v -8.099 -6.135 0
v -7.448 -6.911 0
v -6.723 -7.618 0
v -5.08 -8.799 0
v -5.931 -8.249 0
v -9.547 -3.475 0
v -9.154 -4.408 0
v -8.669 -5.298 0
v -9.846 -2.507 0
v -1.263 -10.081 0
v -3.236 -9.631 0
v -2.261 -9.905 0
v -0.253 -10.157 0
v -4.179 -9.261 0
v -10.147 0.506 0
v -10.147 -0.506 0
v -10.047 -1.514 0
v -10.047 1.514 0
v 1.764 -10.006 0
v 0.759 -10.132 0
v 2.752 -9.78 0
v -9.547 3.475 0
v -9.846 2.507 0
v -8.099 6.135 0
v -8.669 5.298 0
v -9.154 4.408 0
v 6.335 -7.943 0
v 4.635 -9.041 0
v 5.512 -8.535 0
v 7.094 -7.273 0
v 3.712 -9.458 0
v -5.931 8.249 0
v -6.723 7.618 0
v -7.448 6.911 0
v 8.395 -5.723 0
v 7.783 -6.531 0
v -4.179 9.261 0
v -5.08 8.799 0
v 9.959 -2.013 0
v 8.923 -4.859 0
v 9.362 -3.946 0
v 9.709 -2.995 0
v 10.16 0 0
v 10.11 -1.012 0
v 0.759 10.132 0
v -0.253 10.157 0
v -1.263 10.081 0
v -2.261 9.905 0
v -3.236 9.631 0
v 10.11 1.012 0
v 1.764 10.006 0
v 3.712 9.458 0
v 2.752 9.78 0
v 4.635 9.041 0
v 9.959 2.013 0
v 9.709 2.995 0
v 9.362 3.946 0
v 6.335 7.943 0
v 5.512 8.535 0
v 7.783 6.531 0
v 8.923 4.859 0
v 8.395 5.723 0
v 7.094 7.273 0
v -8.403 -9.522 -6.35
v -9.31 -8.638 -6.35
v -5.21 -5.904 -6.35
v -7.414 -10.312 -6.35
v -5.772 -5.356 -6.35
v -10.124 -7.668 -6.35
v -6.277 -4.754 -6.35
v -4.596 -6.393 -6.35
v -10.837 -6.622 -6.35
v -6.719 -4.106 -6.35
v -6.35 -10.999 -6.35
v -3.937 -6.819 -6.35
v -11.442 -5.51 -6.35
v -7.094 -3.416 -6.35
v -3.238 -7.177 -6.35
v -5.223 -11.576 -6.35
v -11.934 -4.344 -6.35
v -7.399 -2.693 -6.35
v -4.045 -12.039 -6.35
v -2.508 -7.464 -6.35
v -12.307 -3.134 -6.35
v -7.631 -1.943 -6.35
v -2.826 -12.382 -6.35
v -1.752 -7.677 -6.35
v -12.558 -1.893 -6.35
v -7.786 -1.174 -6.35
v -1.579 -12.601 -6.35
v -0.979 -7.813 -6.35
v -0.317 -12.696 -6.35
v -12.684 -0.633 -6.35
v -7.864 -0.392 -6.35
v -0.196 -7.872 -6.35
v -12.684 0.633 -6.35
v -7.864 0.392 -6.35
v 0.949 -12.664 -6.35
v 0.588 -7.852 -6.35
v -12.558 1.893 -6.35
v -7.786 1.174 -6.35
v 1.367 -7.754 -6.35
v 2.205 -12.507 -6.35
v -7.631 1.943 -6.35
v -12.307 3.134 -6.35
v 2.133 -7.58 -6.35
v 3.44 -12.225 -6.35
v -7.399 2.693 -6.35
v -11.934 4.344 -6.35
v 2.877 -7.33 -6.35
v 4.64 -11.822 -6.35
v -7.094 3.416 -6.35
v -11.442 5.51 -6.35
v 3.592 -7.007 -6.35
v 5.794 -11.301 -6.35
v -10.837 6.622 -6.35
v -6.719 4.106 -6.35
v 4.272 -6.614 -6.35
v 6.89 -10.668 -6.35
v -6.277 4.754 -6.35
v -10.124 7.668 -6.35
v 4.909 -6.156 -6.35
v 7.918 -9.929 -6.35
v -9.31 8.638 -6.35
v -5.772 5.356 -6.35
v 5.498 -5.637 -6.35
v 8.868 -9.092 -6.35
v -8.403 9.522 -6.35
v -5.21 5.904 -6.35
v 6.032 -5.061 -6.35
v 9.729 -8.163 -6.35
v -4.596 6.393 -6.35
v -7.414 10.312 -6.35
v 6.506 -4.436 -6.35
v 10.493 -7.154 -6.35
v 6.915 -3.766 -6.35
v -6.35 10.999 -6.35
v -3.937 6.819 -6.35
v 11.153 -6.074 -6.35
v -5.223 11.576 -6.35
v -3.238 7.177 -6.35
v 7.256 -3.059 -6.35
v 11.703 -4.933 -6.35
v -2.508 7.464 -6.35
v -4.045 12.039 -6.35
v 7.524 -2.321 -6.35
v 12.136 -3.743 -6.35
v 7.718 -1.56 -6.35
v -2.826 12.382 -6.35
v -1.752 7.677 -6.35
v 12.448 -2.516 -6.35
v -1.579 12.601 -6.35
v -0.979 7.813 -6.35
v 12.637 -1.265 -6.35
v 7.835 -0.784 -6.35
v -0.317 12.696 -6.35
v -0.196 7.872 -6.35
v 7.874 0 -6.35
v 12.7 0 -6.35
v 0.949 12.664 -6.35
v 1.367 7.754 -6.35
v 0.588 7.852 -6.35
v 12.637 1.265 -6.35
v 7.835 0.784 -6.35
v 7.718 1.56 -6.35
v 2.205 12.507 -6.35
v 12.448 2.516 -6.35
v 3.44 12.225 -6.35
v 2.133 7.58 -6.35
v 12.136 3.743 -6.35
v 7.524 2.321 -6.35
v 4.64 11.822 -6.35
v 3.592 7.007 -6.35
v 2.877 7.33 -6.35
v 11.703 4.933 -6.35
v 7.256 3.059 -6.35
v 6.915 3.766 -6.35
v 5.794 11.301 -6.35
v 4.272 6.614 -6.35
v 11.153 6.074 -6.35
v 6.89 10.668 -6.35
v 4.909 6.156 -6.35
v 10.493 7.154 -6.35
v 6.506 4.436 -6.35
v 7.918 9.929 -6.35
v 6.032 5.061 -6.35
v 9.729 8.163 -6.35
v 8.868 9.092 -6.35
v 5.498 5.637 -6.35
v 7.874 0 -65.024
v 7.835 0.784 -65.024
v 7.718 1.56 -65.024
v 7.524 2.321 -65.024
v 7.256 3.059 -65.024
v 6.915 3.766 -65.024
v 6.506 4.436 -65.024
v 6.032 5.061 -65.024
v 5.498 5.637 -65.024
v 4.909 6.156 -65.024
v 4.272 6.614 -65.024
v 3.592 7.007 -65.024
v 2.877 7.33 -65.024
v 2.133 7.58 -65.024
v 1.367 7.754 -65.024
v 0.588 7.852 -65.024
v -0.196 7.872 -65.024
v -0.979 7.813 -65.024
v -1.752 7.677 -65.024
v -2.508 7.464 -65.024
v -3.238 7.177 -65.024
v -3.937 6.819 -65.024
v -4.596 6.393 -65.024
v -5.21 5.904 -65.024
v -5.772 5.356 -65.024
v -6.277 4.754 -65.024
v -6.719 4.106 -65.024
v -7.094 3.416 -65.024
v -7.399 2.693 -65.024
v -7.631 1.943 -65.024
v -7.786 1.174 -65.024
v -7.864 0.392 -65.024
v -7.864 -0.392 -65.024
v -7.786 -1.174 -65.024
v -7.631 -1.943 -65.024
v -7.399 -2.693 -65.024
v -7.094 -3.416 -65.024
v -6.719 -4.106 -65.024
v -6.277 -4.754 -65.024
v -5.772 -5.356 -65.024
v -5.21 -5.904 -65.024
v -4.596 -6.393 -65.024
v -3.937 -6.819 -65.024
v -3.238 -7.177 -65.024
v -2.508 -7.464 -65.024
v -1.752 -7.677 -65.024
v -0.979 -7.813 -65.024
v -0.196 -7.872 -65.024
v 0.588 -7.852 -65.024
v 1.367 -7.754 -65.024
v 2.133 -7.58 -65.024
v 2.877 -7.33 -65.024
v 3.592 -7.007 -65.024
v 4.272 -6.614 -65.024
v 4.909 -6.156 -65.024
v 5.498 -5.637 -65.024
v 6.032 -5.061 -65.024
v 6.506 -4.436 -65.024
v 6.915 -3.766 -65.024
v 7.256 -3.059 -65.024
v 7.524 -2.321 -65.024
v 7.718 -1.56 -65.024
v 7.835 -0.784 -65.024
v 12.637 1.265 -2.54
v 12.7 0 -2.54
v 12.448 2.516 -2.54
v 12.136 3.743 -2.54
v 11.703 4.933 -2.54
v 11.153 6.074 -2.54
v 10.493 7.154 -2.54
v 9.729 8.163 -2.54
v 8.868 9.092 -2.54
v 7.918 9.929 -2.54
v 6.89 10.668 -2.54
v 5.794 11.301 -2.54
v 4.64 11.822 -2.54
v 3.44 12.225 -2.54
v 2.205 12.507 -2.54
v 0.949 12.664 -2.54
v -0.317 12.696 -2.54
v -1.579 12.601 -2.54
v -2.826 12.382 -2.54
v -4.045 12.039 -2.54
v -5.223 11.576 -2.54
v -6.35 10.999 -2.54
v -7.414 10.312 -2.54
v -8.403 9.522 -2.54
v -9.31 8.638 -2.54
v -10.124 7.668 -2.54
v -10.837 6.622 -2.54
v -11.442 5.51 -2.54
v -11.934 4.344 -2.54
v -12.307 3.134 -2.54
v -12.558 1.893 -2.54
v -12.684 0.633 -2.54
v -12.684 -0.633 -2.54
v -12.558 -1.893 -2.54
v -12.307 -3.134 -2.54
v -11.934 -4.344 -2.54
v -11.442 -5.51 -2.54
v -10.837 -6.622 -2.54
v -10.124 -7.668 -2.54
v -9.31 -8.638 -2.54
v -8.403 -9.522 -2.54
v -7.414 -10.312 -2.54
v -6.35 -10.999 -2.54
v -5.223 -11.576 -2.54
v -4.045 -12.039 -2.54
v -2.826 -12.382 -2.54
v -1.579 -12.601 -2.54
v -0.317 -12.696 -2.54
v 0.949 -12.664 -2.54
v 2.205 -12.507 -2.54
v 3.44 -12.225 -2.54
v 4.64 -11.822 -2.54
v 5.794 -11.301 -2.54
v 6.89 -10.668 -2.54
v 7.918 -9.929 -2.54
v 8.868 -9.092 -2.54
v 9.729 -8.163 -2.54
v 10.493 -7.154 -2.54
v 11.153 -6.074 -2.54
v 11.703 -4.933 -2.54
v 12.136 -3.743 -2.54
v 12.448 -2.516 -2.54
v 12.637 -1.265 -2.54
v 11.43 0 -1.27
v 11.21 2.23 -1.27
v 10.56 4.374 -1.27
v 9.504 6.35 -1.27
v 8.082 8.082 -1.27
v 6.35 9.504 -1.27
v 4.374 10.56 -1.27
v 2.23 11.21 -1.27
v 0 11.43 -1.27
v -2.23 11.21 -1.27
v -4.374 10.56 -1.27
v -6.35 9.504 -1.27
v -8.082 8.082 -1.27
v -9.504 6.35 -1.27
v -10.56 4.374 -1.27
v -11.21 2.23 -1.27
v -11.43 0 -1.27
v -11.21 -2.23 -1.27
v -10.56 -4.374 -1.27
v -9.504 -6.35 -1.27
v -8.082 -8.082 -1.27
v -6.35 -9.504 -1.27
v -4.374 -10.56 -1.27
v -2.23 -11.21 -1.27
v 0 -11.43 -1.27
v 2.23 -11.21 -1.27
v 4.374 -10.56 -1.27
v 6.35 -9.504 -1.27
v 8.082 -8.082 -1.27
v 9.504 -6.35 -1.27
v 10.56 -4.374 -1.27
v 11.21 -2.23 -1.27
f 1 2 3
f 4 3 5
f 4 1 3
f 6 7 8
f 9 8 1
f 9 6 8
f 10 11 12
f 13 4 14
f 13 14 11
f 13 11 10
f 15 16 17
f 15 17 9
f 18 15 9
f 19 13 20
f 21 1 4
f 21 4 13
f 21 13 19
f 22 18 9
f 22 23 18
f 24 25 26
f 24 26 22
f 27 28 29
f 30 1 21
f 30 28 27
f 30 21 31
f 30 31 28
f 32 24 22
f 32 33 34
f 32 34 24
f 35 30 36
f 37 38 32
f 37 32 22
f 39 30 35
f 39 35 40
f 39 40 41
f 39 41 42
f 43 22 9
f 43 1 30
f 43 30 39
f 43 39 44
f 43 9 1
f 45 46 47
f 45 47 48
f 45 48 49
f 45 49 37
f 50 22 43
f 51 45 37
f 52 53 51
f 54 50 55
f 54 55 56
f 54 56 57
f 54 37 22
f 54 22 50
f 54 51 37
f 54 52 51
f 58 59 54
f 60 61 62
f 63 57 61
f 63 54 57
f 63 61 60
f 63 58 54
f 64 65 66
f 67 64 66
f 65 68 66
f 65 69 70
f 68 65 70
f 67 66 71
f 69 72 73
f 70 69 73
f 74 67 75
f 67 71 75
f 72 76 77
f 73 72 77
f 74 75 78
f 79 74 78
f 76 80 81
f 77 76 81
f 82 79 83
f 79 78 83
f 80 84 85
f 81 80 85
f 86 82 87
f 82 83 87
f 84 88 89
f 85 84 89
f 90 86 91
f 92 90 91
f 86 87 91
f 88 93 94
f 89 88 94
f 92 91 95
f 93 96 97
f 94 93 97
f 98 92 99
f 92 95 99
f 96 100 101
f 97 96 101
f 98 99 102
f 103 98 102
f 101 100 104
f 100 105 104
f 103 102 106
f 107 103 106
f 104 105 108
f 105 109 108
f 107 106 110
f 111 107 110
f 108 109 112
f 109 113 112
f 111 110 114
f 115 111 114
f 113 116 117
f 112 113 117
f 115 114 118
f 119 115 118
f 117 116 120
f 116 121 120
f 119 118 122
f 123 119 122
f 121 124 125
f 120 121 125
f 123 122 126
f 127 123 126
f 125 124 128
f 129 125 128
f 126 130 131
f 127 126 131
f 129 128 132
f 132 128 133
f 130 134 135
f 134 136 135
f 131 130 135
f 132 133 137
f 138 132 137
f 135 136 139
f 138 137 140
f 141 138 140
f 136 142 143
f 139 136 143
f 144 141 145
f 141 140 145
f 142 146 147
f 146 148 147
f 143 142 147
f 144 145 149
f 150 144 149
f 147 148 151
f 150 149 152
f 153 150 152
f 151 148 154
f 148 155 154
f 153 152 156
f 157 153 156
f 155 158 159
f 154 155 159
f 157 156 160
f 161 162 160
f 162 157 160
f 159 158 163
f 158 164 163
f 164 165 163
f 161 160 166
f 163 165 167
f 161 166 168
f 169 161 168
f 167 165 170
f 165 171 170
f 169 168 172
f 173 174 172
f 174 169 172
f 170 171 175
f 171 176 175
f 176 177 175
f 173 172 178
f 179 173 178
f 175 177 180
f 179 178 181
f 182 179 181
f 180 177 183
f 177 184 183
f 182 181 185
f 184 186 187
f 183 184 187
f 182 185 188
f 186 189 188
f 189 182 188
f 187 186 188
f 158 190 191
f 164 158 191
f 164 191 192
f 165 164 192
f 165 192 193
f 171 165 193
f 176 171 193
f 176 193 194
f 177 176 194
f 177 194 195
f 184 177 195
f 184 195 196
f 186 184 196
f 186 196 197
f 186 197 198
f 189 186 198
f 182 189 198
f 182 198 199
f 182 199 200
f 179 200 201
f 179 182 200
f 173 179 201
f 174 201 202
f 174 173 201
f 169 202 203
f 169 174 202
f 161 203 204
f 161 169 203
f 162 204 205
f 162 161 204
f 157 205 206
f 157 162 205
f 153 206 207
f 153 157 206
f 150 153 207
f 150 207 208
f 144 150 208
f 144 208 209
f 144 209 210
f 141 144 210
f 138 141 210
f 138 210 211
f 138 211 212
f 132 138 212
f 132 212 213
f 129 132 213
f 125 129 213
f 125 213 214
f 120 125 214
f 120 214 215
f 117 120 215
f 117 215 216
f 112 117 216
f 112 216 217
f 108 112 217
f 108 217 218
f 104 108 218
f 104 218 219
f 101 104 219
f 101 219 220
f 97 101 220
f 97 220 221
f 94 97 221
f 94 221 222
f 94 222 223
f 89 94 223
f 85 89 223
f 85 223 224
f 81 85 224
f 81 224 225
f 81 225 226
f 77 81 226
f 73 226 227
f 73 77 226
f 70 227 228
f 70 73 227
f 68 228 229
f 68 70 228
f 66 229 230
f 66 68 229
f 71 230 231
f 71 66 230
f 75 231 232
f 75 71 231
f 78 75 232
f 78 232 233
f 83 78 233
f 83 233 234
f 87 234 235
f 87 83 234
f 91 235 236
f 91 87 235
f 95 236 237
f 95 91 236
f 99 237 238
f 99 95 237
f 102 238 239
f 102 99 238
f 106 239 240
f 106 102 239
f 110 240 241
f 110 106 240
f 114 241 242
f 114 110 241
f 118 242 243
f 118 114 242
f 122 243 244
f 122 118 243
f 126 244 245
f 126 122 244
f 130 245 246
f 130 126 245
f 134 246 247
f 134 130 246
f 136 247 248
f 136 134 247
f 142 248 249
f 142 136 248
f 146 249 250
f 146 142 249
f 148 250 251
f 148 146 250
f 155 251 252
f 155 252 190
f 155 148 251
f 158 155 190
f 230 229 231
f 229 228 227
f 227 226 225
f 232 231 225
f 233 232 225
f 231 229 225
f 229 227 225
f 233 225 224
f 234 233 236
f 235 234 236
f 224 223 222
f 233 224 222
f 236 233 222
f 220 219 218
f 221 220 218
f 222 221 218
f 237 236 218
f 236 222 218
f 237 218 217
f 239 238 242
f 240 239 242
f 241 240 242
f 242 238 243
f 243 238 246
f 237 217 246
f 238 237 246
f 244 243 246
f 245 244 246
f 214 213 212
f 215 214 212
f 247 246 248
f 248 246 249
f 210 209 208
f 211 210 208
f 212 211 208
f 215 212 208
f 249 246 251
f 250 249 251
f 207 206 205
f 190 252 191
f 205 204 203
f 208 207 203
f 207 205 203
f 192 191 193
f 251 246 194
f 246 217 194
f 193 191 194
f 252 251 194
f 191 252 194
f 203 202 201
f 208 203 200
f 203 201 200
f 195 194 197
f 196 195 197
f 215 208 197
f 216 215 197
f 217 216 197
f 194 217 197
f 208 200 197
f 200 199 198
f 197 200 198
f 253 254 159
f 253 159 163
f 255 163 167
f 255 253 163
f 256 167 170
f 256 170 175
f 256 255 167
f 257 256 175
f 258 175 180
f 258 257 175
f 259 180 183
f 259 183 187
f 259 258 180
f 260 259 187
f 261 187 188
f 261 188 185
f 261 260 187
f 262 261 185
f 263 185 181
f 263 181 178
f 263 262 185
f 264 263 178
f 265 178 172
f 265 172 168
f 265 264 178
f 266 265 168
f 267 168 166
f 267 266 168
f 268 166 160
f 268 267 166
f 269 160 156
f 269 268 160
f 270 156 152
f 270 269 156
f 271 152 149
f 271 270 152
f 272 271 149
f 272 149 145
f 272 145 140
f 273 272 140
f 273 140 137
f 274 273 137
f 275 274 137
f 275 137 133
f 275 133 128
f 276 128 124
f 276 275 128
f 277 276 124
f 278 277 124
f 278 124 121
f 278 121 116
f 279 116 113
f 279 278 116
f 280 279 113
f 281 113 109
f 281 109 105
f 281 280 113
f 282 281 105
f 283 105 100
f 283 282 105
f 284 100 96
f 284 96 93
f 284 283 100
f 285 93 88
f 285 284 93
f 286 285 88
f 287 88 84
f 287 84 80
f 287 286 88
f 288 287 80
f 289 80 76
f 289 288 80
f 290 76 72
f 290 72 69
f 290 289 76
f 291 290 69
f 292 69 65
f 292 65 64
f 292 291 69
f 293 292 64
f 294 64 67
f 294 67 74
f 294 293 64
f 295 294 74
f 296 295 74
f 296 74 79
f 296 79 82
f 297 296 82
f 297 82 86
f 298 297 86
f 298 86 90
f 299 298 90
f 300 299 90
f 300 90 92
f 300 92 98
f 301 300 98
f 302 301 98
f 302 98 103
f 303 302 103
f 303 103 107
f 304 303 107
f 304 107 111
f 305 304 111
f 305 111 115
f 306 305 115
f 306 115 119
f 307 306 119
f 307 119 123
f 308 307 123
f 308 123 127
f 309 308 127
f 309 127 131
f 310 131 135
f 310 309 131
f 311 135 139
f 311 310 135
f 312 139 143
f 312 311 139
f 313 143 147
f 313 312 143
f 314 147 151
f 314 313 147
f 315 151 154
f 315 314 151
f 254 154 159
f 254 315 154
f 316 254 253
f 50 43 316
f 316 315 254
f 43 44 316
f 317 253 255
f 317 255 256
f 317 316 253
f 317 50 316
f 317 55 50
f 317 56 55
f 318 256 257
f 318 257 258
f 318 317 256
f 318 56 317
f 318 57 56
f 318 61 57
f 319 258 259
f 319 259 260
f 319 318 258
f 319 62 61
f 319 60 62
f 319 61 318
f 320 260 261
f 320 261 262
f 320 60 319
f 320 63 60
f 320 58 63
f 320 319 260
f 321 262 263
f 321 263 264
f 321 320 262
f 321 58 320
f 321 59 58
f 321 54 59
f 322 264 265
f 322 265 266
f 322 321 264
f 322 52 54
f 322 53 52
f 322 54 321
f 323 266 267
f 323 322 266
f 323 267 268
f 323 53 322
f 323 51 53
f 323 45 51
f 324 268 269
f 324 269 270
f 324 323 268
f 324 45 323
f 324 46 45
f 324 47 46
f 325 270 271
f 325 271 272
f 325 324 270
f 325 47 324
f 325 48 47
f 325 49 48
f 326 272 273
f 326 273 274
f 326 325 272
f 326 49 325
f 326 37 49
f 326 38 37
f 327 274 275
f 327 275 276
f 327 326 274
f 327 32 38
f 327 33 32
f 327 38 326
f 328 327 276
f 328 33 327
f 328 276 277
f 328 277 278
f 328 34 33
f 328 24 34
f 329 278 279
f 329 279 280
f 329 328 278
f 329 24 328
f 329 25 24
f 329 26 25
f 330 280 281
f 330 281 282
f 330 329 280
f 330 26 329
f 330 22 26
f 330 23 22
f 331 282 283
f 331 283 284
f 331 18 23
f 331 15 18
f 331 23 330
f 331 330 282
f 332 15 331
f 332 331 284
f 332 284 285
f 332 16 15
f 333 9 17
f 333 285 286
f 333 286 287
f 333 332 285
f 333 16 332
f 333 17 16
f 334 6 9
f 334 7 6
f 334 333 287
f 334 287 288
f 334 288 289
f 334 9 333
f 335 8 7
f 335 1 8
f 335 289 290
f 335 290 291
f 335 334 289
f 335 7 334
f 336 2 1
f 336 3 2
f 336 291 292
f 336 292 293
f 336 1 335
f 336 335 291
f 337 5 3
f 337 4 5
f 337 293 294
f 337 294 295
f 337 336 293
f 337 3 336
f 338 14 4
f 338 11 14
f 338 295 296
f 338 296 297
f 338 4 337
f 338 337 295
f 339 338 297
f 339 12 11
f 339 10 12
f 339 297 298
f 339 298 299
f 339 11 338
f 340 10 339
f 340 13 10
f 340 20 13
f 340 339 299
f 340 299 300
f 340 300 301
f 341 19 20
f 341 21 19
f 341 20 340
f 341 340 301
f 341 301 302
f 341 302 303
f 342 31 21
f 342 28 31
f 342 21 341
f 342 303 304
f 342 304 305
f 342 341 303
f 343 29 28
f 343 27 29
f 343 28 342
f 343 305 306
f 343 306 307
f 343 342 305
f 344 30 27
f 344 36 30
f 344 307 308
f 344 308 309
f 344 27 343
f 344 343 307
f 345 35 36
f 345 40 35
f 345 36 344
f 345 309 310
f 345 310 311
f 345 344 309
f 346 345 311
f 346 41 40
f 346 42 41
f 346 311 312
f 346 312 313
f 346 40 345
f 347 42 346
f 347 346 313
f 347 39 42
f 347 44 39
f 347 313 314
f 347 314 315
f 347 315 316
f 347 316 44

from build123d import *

# Parameters (mm, degrees)
SKETCH1_R           = 7.874
BOSS_EXTRUDE1_DEPTH = 65.024
SKETCH2_R           = 12.7
BOSS_EXTRUDE2_DEPTH = 6.35
CHAMFER1_SIZE       = 2.54


with BuildPart() as part:
    # Sketch1 → Boss-Extrude1 (new body)
    with BuildSketch(Plane.XY):
        Circle(SKETCH1_R)
    extrude(amount=-BOSS_EXTRUDE1_DEPTH)

    # Sketch2 → Boss-Extrude2 (add)
    with BuildSketch(Plane.XY):
        Circle(SKETCH2_R)
    extrude(amount=-BOSS_EXTRUDE2_DEPTH)

    # Chamfer1
    chamfer1_edges = [part.edges().sort_by_distance(p)[0] for p in [
        (-12.7, 0, 0),
    ]]
    chamfer(chamfer1_edges, length=CHAMFER1_SIZE)


solid = part.part
